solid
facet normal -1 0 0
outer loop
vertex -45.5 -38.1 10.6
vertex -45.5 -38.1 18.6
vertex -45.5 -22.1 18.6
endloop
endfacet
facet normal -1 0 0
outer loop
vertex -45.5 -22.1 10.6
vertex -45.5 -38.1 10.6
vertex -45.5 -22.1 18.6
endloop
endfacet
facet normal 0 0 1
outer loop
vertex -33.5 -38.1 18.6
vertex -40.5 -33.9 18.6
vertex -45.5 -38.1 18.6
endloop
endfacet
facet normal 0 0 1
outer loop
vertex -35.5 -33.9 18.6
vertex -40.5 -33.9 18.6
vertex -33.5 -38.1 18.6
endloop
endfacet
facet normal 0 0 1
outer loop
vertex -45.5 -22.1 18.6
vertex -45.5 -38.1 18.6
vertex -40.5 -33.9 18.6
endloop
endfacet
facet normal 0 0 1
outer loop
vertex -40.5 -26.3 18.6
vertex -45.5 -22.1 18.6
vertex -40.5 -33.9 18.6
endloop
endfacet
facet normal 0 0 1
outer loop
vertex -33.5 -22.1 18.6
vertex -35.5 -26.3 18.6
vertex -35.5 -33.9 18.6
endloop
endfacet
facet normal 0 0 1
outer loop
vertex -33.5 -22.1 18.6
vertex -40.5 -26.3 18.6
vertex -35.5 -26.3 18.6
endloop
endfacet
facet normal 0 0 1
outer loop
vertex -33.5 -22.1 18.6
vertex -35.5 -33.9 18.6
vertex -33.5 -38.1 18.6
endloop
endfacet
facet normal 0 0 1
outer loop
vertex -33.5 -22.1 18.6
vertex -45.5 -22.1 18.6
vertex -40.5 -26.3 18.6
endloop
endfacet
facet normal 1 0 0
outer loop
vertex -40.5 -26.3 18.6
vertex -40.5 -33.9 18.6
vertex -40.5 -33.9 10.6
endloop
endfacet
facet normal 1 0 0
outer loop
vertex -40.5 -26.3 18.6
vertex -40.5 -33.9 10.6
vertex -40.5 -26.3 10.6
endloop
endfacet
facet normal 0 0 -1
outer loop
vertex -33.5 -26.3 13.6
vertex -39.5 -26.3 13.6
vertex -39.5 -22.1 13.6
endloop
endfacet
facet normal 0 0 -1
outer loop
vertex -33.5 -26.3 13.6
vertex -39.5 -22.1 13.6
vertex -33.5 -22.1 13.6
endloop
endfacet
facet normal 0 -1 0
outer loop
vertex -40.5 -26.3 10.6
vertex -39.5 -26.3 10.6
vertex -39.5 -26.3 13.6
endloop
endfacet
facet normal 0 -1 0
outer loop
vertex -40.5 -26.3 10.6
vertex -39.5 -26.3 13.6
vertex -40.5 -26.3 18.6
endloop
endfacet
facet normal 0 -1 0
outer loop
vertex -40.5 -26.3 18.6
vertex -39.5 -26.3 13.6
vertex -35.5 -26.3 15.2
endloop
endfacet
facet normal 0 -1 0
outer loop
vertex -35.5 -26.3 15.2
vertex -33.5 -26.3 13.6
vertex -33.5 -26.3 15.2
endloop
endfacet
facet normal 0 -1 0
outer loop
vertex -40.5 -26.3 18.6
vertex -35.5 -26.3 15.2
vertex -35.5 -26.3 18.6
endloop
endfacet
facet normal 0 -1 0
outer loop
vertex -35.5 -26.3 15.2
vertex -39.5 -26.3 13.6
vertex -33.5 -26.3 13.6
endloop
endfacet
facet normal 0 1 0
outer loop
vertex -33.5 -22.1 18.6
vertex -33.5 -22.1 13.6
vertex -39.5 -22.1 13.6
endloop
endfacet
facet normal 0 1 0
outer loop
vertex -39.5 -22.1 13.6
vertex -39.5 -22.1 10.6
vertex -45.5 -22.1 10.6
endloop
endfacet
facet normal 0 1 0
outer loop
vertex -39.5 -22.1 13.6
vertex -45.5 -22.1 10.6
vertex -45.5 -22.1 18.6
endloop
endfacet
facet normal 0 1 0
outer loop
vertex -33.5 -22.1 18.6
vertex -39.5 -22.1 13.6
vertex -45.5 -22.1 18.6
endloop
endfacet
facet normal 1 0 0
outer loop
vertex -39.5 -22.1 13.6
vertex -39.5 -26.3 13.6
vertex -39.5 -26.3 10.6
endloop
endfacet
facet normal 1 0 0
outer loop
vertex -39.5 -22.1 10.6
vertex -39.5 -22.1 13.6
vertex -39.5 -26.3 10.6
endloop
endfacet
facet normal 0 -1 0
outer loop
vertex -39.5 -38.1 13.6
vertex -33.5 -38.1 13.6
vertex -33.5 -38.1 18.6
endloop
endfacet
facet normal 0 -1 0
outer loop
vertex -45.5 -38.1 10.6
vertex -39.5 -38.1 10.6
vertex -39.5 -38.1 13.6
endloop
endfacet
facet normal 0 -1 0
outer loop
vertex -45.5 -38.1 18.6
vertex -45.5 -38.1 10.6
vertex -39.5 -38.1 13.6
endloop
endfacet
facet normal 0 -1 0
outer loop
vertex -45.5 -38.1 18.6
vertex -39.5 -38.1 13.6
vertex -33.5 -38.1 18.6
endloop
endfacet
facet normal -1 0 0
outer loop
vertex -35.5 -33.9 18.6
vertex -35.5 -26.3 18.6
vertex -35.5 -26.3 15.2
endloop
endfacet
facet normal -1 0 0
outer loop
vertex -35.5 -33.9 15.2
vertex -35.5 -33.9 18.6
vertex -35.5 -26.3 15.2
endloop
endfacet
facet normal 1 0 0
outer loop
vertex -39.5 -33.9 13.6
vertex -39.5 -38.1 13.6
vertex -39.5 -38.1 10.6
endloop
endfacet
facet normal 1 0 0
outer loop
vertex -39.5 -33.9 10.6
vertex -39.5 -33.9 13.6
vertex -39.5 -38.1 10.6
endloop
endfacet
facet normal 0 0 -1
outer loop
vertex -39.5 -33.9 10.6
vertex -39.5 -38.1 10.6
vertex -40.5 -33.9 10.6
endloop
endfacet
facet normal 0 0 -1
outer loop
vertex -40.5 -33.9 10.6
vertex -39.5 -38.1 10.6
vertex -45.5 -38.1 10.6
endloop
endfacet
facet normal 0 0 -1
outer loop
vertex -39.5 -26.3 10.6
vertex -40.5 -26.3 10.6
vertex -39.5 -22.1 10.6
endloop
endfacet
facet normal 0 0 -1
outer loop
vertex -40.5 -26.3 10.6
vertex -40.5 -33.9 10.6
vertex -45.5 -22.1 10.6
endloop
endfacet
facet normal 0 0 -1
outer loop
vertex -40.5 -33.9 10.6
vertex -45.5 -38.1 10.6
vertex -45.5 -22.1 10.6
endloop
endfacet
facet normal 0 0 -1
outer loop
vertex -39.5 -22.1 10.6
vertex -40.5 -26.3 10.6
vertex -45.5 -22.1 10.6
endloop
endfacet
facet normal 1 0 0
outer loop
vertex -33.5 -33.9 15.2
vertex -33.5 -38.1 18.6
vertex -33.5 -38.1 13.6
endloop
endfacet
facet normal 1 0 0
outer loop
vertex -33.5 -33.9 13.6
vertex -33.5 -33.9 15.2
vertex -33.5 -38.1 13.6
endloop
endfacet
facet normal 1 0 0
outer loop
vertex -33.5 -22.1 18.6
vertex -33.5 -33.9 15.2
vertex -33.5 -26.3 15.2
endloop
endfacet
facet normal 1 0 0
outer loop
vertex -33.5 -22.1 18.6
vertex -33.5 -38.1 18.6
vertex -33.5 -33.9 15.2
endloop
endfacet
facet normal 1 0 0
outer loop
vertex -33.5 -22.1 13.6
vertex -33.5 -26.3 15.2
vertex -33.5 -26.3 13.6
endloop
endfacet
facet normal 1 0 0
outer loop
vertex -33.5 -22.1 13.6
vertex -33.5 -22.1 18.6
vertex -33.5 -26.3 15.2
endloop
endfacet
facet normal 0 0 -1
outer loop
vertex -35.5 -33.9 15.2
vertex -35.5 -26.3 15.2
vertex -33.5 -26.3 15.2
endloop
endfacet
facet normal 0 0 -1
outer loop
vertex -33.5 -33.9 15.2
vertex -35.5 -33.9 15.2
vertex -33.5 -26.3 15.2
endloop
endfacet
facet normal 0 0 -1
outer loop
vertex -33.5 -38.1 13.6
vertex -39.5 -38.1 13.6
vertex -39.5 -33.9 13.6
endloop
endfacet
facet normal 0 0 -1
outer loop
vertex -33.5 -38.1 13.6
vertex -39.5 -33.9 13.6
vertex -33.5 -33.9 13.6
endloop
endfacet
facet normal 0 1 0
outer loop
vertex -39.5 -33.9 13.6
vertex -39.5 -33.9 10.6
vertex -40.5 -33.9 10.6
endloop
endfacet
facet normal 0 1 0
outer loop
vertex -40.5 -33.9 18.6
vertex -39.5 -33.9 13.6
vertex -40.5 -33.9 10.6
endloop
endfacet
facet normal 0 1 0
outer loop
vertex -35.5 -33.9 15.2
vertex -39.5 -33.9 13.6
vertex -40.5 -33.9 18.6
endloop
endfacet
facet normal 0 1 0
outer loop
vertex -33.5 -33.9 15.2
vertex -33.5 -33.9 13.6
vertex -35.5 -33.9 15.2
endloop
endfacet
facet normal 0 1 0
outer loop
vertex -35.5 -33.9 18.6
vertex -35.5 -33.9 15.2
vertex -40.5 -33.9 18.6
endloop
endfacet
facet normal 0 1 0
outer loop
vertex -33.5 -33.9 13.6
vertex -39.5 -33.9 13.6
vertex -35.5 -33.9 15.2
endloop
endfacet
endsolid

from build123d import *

# Parameters (mm, degrees)
SKETCH048_W     = 16
SKETCH048_H     = 8
PAD027_DEPTH    = 12
SKETCH049_W     = 7.6
SKETCH049_H     = 8
POCKET017_DEPTH = 7
SKETCH050_W     = 3
SKETCH050_H     = 6
POCKET018_DEPTH = 16.001
SKETCH060_W     = 3.4
SKETCH060_H     = 2
PAD032_DEPTH    = 9


with BuildPart() as part:
    # Sketch048 → Pad027 (new body)
    with BuildSketch(Plane.YZ):
        with Locations((0, 4)):
            Rectangle(SKETCH048_W, SKETCH048_H)
    extrude(amount=PAD027_DEPTH)

    # Sketch049 (on Face6 of Pad027) → Pocket017 (cut)
    with BuildSketch(Plane.YZ.offset(12)):
        with Locations((0, 4)):
            Rectangle(SKETCH049_W, SKETCH049_H)
    extrude(amount=-POCKET017_DEPTH, mode=Mode.SUBTRACT)

    # Sketch050 (on Face9 of Pocket017) → Pocket018 (cut, through all)
    with BuildSketch(Plane(origin=(0, -8, 0), x_dir=(0, 0, -1), z_dir=(0, -1, 0))):
        with Locations((-1.5, 9)):
            Rectangle(SKETCH050_W, SKETCH050_H)
    extrude(amount=-POCKET018_DEPTH, mode=Mode.SUBTRACT)

    # Sketch060 (on Face5 of Pocket018) → Pad032 (join)
    with BuildSketch(Plane(origin=(0, 3.8, 0), x_dir=(0, 0, -1), z_dir=(0, -1, 0))):
        with Locations((-6.3, 11)):
            Rectangle(SKETCH060_W, SKETCH060_H)
    extrude(amount=PAD032_DEPTH)


with BuildPart() as part_1:
    # Body005 placement: moved
    add(part.part.moved(Location((-45.5, -30.1, 10.6))))


solid = part_1.part
